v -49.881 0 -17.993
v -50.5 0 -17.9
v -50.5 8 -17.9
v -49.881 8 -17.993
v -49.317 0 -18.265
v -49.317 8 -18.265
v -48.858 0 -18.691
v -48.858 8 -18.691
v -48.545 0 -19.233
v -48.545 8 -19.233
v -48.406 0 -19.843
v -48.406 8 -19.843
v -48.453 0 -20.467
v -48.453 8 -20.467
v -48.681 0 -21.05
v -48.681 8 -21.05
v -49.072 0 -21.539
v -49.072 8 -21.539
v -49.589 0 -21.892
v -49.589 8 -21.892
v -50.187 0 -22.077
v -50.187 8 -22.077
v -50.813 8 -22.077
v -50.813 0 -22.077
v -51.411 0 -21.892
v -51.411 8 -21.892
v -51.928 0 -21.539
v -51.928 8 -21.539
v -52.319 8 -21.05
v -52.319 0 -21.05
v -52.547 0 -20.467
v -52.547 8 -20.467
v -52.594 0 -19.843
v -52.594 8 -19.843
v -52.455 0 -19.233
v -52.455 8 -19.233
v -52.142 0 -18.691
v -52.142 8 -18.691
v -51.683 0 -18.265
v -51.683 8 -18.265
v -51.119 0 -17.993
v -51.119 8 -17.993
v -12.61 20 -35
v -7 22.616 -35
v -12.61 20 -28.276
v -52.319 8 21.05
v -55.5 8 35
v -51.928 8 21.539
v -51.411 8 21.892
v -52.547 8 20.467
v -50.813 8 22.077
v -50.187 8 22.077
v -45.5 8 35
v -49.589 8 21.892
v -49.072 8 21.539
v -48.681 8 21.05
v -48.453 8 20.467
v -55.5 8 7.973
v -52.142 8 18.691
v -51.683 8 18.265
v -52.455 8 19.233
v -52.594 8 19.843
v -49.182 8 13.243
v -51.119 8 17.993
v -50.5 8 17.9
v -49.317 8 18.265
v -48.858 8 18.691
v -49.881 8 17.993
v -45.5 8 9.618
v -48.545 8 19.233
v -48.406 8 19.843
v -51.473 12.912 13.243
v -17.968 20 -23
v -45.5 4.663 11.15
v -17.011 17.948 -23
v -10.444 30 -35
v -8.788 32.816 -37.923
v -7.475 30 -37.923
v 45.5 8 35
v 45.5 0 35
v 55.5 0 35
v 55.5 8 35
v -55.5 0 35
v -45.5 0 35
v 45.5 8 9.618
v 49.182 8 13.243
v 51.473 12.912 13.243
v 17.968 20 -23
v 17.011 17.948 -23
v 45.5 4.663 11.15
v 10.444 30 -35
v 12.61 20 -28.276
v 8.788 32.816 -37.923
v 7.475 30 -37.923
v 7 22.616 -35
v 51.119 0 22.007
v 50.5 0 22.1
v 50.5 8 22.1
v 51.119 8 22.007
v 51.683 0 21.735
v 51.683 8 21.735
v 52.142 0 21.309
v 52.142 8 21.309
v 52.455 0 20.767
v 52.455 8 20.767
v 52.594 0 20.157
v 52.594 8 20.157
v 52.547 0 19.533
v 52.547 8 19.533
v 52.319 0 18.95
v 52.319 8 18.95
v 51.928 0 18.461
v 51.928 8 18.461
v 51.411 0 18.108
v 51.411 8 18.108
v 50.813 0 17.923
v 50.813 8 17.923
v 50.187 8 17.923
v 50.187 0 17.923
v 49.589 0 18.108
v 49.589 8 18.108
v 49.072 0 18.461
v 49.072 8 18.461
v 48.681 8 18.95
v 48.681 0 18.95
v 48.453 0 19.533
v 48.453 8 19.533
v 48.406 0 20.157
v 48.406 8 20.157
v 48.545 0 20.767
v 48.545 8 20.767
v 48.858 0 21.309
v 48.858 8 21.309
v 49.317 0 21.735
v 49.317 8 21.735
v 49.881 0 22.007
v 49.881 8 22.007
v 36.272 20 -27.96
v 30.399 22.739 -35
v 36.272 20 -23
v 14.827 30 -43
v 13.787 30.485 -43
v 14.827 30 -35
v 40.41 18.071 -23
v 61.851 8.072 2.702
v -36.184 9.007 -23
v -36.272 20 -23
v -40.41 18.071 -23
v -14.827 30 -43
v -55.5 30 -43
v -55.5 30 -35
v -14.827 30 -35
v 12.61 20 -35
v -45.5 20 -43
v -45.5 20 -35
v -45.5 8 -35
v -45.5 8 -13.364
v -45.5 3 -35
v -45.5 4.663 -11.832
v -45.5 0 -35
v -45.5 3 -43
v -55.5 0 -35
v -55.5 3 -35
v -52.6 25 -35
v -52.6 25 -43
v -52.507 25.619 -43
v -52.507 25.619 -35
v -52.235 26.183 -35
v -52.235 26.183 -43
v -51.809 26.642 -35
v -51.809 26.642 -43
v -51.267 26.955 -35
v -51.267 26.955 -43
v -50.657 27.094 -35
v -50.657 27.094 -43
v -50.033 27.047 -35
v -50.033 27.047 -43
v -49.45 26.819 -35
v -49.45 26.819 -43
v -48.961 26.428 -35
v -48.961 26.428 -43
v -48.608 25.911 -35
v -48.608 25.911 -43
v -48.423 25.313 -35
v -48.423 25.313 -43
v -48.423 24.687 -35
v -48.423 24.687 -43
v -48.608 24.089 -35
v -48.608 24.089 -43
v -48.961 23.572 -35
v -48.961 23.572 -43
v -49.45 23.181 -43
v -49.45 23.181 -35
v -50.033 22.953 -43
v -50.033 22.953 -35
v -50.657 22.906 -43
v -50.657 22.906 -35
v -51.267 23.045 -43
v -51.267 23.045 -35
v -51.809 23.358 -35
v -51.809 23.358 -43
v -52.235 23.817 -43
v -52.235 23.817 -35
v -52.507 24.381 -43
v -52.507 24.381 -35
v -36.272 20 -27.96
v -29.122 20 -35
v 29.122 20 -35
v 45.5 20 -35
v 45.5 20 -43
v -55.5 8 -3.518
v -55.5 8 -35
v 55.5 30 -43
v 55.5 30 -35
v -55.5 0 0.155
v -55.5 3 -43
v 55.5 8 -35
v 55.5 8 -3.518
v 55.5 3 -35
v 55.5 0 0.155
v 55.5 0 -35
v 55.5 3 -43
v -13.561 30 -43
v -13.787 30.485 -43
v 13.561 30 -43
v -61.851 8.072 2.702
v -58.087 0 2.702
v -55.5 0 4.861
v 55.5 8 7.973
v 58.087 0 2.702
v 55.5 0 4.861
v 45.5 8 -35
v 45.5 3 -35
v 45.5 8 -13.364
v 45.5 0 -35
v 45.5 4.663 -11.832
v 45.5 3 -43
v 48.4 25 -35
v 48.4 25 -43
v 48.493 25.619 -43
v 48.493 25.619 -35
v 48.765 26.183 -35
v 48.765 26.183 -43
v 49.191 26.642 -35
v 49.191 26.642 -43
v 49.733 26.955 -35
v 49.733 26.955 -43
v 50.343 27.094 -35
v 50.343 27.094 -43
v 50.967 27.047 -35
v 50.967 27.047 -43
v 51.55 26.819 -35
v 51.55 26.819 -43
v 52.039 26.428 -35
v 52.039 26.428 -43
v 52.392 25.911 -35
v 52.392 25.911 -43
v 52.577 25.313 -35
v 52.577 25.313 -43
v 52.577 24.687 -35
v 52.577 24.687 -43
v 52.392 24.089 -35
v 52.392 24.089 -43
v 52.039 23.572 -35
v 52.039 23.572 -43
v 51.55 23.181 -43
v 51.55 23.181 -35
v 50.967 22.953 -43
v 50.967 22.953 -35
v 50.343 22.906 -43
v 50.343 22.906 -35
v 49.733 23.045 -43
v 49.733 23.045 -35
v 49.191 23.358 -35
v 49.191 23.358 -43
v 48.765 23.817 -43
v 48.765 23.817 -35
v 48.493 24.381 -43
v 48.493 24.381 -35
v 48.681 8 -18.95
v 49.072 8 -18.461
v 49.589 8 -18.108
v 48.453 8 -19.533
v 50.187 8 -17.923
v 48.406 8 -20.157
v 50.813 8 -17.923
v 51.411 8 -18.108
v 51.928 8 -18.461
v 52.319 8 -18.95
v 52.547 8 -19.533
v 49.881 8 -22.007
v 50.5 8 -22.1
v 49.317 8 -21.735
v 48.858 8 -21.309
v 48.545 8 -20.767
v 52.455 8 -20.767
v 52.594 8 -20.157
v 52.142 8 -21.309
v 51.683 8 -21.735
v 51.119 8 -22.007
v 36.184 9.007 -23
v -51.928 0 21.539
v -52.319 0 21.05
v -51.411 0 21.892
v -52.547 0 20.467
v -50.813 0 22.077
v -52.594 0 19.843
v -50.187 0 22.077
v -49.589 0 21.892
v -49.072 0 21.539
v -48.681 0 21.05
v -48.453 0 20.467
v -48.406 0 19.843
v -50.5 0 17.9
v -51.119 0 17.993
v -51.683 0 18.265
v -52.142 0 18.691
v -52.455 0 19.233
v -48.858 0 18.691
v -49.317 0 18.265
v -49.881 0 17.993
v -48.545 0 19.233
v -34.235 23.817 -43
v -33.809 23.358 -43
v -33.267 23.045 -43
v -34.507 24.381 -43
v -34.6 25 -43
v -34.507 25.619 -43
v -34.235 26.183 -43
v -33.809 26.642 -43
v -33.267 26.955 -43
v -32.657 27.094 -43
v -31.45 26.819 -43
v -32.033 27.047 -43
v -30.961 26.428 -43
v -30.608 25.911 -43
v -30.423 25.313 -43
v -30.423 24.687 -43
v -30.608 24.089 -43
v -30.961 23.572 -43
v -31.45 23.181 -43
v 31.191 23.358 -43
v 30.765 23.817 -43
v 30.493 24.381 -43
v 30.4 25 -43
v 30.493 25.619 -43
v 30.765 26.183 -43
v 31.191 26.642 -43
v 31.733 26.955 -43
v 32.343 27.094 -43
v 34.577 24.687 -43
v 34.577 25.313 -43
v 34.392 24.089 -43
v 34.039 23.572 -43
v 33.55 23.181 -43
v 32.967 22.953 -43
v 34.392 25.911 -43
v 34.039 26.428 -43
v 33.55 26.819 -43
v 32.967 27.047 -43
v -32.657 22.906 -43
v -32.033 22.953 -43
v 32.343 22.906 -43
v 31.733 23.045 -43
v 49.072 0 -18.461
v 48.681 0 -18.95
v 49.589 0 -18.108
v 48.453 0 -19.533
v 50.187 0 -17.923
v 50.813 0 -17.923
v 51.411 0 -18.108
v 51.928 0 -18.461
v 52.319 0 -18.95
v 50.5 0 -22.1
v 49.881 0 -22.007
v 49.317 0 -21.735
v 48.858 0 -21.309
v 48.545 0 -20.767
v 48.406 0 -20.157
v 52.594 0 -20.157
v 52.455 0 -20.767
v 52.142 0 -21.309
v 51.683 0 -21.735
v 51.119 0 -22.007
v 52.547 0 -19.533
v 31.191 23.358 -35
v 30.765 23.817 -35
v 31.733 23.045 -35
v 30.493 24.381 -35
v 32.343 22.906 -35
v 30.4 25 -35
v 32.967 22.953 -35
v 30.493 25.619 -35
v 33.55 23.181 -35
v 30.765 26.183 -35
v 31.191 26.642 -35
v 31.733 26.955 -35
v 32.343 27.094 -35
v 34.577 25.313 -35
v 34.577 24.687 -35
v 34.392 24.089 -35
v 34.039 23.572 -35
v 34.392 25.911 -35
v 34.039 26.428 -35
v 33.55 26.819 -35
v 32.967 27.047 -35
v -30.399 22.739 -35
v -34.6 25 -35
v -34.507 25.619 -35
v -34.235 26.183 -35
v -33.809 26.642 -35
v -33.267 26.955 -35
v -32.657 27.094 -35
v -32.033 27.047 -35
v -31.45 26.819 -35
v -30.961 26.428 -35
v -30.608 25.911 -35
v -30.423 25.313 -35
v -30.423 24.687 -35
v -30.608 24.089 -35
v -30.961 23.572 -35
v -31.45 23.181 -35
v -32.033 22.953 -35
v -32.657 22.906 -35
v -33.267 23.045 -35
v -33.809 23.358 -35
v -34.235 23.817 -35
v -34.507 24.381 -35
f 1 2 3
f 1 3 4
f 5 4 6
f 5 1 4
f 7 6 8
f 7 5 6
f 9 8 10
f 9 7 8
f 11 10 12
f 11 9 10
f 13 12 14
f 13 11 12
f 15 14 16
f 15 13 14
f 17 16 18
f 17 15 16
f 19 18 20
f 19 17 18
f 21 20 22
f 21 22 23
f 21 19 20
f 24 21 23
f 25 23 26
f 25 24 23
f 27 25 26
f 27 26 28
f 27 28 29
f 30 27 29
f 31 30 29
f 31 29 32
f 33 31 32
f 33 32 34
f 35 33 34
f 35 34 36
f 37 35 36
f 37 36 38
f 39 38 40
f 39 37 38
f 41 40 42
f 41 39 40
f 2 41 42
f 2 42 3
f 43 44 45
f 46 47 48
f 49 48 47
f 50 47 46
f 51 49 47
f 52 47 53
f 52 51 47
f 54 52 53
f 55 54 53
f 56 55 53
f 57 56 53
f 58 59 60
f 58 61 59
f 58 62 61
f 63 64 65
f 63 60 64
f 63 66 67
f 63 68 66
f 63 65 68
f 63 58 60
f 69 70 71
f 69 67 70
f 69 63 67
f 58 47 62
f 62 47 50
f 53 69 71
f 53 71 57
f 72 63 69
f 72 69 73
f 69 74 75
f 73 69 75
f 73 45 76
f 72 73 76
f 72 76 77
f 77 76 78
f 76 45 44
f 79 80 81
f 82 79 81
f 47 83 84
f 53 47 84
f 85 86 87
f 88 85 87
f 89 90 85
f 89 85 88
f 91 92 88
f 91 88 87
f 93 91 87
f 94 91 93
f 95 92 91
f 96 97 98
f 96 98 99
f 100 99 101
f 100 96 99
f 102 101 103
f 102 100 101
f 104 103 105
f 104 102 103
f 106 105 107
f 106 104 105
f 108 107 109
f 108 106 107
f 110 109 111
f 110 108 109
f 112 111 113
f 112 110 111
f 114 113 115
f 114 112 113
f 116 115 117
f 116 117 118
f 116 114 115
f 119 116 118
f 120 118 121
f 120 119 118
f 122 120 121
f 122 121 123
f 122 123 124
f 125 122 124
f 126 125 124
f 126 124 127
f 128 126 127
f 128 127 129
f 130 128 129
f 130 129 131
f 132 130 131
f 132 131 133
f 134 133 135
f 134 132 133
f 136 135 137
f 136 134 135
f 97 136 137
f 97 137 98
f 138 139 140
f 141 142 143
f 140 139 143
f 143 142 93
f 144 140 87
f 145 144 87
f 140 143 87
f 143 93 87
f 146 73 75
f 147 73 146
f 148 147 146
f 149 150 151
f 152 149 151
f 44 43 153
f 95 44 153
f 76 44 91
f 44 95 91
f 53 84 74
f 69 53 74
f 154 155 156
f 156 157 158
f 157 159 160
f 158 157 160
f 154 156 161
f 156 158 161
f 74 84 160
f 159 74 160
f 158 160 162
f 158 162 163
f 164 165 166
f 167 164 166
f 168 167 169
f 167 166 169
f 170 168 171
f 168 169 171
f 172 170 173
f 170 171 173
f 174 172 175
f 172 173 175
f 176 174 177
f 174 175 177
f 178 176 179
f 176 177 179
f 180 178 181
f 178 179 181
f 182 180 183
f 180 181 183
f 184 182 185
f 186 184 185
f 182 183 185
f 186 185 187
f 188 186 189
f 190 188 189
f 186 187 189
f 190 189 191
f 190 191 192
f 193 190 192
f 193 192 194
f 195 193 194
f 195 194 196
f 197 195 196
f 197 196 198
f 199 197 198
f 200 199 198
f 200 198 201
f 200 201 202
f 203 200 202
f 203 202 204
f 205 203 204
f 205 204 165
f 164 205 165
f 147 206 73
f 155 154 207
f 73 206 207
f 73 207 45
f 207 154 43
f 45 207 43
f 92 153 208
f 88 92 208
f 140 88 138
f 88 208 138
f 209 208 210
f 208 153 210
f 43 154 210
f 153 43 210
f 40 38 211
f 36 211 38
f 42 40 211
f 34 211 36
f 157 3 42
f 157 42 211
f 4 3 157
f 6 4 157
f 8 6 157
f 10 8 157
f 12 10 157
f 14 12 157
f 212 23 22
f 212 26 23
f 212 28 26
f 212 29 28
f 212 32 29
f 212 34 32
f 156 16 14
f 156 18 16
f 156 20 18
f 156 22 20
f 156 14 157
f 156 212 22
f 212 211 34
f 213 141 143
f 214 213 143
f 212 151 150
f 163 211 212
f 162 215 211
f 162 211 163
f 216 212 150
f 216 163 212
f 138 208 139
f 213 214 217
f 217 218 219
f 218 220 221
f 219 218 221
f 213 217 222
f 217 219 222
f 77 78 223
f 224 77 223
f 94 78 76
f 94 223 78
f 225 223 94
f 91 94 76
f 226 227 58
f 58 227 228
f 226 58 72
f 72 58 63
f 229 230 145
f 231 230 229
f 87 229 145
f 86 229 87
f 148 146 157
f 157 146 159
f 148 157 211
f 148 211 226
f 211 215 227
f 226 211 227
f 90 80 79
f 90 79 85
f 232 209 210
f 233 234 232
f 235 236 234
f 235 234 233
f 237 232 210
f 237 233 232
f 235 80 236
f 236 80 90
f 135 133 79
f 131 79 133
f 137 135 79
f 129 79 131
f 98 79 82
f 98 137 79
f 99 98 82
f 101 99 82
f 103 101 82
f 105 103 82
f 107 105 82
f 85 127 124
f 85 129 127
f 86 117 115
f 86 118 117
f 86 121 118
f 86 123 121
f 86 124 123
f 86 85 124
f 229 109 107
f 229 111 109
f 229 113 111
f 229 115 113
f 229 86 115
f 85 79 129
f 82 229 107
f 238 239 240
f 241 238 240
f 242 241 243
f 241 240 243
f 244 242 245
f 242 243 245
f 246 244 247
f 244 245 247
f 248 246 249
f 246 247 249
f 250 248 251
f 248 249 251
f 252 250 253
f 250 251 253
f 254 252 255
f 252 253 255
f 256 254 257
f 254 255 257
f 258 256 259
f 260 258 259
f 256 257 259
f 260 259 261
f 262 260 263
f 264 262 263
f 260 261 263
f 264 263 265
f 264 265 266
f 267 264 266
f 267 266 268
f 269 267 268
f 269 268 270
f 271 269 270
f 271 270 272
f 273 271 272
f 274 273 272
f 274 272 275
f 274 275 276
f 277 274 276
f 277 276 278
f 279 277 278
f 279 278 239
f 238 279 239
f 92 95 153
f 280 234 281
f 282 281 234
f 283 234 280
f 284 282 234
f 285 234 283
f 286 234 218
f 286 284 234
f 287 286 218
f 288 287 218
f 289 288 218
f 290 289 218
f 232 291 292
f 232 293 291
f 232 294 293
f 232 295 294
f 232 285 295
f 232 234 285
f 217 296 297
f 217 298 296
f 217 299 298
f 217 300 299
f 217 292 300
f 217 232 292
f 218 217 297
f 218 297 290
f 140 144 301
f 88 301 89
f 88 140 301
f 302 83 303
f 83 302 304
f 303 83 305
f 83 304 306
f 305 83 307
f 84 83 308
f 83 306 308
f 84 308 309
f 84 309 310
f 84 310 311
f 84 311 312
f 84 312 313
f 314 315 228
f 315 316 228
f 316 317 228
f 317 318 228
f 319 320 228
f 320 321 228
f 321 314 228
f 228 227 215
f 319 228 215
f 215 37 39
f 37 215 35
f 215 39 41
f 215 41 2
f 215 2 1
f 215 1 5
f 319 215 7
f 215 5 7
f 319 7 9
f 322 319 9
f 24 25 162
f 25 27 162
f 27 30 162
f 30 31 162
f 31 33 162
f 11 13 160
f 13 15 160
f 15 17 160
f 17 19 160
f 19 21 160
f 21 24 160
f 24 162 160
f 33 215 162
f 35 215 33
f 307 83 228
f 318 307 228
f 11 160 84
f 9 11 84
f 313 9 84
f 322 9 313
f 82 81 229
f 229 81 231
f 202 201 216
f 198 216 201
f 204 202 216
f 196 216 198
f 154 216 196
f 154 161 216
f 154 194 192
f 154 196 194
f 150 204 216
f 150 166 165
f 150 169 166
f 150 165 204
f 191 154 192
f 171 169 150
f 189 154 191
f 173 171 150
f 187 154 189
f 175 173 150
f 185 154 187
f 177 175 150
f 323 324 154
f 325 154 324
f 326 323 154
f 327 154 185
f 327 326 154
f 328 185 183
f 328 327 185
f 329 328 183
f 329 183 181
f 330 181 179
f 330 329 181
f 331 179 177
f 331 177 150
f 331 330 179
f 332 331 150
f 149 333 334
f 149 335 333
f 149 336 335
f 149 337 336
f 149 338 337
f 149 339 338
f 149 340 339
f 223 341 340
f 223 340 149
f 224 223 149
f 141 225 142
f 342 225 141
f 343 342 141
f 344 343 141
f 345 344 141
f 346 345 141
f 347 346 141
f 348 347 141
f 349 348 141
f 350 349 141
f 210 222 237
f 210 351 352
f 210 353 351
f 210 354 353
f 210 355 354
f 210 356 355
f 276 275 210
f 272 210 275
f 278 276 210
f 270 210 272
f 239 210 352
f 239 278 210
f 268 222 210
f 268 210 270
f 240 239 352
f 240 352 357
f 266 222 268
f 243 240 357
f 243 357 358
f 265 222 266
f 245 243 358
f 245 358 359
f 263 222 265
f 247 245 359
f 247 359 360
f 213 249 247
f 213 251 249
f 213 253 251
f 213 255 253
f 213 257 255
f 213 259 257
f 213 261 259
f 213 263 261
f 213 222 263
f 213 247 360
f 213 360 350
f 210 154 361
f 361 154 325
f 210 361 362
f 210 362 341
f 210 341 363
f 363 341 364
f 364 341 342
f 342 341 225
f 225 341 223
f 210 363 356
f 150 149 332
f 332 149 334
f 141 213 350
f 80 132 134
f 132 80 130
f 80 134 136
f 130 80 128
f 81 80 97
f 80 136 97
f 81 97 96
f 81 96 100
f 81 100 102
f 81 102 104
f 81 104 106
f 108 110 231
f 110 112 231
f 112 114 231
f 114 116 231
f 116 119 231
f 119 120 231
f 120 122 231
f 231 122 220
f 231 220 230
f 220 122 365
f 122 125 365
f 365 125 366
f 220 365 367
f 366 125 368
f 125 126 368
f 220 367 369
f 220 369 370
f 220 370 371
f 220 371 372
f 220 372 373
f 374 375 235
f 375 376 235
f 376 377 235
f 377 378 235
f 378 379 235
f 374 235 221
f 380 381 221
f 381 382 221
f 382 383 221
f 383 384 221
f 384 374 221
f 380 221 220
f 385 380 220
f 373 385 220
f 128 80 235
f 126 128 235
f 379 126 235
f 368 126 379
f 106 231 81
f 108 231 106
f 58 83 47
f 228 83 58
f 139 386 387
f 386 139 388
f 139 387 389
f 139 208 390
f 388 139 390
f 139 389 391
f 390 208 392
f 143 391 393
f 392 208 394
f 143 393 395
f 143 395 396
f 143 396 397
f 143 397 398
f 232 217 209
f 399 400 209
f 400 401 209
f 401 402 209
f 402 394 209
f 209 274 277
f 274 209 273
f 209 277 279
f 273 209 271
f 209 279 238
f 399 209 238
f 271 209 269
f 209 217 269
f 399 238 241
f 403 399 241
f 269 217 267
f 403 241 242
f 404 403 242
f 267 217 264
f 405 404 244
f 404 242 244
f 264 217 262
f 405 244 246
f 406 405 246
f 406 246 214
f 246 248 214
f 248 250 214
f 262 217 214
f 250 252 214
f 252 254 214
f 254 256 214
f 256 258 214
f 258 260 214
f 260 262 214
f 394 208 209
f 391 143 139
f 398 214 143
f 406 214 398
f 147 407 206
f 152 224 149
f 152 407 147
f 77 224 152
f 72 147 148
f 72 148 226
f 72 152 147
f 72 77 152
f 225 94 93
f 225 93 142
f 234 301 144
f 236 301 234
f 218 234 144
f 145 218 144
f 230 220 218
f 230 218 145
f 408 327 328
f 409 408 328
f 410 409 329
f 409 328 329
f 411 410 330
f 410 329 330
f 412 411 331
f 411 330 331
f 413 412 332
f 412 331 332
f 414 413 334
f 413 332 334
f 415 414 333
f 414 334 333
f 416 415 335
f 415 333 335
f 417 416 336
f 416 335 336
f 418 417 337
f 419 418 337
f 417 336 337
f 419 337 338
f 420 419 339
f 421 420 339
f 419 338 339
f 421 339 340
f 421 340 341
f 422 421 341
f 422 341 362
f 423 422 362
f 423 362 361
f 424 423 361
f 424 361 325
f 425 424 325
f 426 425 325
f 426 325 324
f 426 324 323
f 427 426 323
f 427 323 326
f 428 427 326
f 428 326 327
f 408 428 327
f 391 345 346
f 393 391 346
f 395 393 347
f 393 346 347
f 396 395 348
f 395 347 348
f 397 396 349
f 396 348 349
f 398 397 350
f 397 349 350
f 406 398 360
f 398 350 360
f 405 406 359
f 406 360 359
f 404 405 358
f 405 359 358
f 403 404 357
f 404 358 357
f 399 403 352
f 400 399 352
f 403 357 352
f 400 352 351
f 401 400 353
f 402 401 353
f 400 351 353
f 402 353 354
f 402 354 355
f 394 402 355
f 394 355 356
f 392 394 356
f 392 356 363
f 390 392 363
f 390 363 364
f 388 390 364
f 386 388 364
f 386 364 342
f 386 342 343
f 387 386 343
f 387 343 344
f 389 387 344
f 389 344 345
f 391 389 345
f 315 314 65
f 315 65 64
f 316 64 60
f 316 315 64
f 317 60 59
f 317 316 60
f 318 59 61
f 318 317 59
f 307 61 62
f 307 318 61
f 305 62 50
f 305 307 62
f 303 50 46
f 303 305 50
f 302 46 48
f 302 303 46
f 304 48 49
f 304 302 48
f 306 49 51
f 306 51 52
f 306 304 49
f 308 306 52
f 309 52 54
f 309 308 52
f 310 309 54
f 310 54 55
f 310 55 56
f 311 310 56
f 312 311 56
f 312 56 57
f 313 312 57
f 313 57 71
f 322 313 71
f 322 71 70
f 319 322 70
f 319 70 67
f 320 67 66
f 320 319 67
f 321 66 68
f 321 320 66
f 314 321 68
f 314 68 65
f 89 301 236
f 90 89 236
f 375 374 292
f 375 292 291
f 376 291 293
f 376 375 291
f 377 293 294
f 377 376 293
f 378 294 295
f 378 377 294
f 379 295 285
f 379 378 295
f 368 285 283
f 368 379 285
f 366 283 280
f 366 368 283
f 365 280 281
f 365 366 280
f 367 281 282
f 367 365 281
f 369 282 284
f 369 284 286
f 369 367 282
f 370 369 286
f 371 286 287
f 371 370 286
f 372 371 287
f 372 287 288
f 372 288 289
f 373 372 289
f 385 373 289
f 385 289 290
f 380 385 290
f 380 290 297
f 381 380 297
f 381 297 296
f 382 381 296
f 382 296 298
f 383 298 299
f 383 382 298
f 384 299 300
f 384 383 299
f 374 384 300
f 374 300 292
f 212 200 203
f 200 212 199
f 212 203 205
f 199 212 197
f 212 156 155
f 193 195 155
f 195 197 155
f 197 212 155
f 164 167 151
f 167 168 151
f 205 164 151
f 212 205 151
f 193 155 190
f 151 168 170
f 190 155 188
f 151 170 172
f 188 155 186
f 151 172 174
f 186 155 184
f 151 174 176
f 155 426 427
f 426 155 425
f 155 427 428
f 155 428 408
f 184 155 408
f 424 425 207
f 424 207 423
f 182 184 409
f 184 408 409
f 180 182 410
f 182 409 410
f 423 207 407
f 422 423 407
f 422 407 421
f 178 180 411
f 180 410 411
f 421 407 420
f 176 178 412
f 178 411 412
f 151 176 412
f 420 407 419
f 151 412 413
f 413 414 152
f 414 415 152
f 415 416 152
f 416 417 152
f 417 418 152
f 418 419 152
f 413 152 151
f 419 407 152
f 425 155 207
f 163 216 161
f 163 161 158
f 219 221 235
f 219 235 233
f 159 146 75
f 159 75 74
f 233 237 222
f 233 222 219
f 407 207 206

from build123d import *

# Parameters (mm, degrees)
SKETCH_1_W          = 10
SKETCH_1_H          = 70
SKETCH_1_R          = 2.1
EXTRUDE_1_DEPTH     = 8
EXTRUDE_1_2_DEPTH   = 8
SKETCH_2_W          = 10
SKETCH_2_H          = 8
EXTRUDE_2_DEPTH     = 30
SKETCH_4_W          = 8
SKETCH_4_H          = 10
EXTRUDE_3_DEPTH     = 97
SKETCH_6_R          = 2.1
CUT_EXTRUDE_1_DEPTH = 101.320735643
EXTRUDE_4_DEPTH     = 10
SKETCH_11_W         = 111
SKETCH_11_H         = 6
CUT_EXTRUDE_3_DEPTH = 86.153989901
CUT_EXTRUDE_5_DEPTH = 20
SKETCH_13_W         = 8
SKETCH_13_H         = 3
CUT_EXTRUDE_7_DEPTH = 130.217721636
SKETCH_14_W         = 130
SKETCH_14_H         = 5
CUT_EXTRUDE_8_DEPTH = 105.816357447


with BuildPart() as part:
    # 草图1 → 凸台-拉伸1 (new body)
    with BuildSketch(Plane(origin=(0, 0, 0), x_dir=(1, 0, 0), z_dir=(0, 1, 0))):
        with Locations((-50.5, 0)):
            Rectangle(SKETCH_1_W, SKETCH_1_H)
        with Locations(Location((-50.5, 20, 0), (0, 0, 270))):
            Circle(SKETCH_1_R, mode=Mode.SUBTRACT)
        with Locations(Location((-50.5, -20, 0), (0, 0, 90))):
            Circle(SKETCH_1_R, mode=Mode.SUBTRACT)
    extrude(amount=EXTRUDE_1_DEPTH)



with BuildPart() as body_2:
    # 草图1 → Extrude 1 2 (new body)
    with BuildSketch(Plane(origin=(0, 0, 0), x_dir=(1, 0, 0), z_dir=(0, 1, 0))):
        with Locations((50.5, 0)):
            Rectangle(SKETCH_1_W, SKETCH_1_H)
        with Locations(Location((50.5, -20, 0), (0, 0, 270))):
            Circle(SKETCH_1_R, mode=Mode.SUBTRACT)
        with Locations(Location((50.5, 20, 0), (0, 0, 90))):
            Circle(SKETCH_1_R, mode=Mode.SUBTRACT)
    extrude(amount=EXTRUDE_1_2_DEPTH)


with BuildPart() as part_1:
    add(part.part)

    add(body_2.part)  # 凸台-拉伸2 merges body 2
    # 草图2 → 凸台-拉伸2 (add)
    with BuildSketch(Plane(origin=(0, 0, 0), x_dir=(1, 0, 0), z_dir=(0, 1, 0))):
        with Locations((-50.5, 39)):
            Rectangle(SKETCH_2_W, SKETCH_2_H)
        with Locations((50.5, 39)):
            Rectangle(SKETCH_2_W, SKETCH_2_H)
    extrude(amount=EXTRUDE_2_DEPTH)

    # 草图4 → 凸台-拉伸3 (add)
    with BuildSketch(Plane.ZY.offset(-45.5)):
        with Locations((-39, 25)):
            Rectangle(SKETCH_4_W, SKETCH_4_H)
    extrude(amount=EXTRUDE_3_DEPTH)

    # 草图6 → 切除-拉伸1 (cut, through all)
    with BuildSketch(Plane(origin=(0, 0, -43), x_dir=(-1, 0, 0), z_dir=(0, 0, -1))):
        with Locations((-50.5, 25)):
            Circle(SKETCH_6_R)
        with Locations((-32.5, 25)):
            Circle(SKETCH_6_R)
        with Locations((32.5, 25)):
            Circle(SKETCH_6_R)
        with Locations((50.5, 25)):
            Circle(SKETCH_6_R)
    extrude(amount=-CUT_EXTRUDE_1_DEPTH, mode=Mode.SUBTRACT)

    # 草图9 → 凸台-拉伸4 (add)
    with BuildSketch(Plane(origin=(-9.912643831, 21.257733297, 0), x_dir=(0, 0, 1), z_dir=(-0.4226182617407003, 0.9063077870366496, 0))):
        Polygon((13.243149515, -41.193317821), (-37.922770357, 5.903700872), (-48.463730846, -5.547935659), (2.702189027, -52.644954352), align=None)
    extrude_4 = extrude(amount=EXTRUDE_4_DEPTH)

    # 镜向2: 凸台-拉伸4 across plane
    add(extrude_4.mirror(Plane(origin=(0, 0, 0), x_dir=(0, 0, 1), z_dir=(1, 0, 0))))

    # 草图11 → 切除-拉伸3 (cut, through all)
    with BuildSketch(Plane(origin=(0, 0, 0), x_dir=(1, 0, 0), z_dir=(0, 1, 0))):
        with Locations((0, 46)):
            Rectangle(SKETCH_11_W, SKETCH_11_H)
    extrude(amount=CUT_EXTRUDE_3_DEPTH, mode=Mode.SUBTRACT)

    # 草图12 → 切除-拉伸5 (cut)
    with BuildSketch(Plane(origin=(0, 0, -43), x_dir=(-1, 0, 0), z_dir=(0, 0, -1))):
        Polygon((-45.5, 20), (-45.5, 0), (-60, 0), (-60, -5), (60, -5), (60, 0), (45.5, 0), (45.5, 20), align=None)
    extrude(amount=-CUT_EXTRUDE_5_DEPTH, mode=Mode.SUBTRACT)

    # 草图13 → 切除-拉伸7 (cut, through all)
    with BuildSketch(Plane.ZY.offset(55.5)):
        with Locations((-39, 1.5)):
            Rectangle(SKETCH_13_W, SKETCH_13_H)
    extrude(amount=-CUT_EXTRUDE_7_DEPTH, mode=Mode.SUBTRACT)

    # 草图14 → 切除-拉伸8 (cut, through all)
    with BuildSketch(Plane(origin=(0, 0, -43), x_dir=(-1, 0, 0), z_dir=(0, 0, -1))):
        with Locations((0, -2.5)):
            Rectangle(SKETCH_14_W, SKETCH_14_H)
    extrude(amount=-CUT_EXTRUDE_8_DEPTH, mode=Mode.SUBTRACT)


solid = part_1.part
